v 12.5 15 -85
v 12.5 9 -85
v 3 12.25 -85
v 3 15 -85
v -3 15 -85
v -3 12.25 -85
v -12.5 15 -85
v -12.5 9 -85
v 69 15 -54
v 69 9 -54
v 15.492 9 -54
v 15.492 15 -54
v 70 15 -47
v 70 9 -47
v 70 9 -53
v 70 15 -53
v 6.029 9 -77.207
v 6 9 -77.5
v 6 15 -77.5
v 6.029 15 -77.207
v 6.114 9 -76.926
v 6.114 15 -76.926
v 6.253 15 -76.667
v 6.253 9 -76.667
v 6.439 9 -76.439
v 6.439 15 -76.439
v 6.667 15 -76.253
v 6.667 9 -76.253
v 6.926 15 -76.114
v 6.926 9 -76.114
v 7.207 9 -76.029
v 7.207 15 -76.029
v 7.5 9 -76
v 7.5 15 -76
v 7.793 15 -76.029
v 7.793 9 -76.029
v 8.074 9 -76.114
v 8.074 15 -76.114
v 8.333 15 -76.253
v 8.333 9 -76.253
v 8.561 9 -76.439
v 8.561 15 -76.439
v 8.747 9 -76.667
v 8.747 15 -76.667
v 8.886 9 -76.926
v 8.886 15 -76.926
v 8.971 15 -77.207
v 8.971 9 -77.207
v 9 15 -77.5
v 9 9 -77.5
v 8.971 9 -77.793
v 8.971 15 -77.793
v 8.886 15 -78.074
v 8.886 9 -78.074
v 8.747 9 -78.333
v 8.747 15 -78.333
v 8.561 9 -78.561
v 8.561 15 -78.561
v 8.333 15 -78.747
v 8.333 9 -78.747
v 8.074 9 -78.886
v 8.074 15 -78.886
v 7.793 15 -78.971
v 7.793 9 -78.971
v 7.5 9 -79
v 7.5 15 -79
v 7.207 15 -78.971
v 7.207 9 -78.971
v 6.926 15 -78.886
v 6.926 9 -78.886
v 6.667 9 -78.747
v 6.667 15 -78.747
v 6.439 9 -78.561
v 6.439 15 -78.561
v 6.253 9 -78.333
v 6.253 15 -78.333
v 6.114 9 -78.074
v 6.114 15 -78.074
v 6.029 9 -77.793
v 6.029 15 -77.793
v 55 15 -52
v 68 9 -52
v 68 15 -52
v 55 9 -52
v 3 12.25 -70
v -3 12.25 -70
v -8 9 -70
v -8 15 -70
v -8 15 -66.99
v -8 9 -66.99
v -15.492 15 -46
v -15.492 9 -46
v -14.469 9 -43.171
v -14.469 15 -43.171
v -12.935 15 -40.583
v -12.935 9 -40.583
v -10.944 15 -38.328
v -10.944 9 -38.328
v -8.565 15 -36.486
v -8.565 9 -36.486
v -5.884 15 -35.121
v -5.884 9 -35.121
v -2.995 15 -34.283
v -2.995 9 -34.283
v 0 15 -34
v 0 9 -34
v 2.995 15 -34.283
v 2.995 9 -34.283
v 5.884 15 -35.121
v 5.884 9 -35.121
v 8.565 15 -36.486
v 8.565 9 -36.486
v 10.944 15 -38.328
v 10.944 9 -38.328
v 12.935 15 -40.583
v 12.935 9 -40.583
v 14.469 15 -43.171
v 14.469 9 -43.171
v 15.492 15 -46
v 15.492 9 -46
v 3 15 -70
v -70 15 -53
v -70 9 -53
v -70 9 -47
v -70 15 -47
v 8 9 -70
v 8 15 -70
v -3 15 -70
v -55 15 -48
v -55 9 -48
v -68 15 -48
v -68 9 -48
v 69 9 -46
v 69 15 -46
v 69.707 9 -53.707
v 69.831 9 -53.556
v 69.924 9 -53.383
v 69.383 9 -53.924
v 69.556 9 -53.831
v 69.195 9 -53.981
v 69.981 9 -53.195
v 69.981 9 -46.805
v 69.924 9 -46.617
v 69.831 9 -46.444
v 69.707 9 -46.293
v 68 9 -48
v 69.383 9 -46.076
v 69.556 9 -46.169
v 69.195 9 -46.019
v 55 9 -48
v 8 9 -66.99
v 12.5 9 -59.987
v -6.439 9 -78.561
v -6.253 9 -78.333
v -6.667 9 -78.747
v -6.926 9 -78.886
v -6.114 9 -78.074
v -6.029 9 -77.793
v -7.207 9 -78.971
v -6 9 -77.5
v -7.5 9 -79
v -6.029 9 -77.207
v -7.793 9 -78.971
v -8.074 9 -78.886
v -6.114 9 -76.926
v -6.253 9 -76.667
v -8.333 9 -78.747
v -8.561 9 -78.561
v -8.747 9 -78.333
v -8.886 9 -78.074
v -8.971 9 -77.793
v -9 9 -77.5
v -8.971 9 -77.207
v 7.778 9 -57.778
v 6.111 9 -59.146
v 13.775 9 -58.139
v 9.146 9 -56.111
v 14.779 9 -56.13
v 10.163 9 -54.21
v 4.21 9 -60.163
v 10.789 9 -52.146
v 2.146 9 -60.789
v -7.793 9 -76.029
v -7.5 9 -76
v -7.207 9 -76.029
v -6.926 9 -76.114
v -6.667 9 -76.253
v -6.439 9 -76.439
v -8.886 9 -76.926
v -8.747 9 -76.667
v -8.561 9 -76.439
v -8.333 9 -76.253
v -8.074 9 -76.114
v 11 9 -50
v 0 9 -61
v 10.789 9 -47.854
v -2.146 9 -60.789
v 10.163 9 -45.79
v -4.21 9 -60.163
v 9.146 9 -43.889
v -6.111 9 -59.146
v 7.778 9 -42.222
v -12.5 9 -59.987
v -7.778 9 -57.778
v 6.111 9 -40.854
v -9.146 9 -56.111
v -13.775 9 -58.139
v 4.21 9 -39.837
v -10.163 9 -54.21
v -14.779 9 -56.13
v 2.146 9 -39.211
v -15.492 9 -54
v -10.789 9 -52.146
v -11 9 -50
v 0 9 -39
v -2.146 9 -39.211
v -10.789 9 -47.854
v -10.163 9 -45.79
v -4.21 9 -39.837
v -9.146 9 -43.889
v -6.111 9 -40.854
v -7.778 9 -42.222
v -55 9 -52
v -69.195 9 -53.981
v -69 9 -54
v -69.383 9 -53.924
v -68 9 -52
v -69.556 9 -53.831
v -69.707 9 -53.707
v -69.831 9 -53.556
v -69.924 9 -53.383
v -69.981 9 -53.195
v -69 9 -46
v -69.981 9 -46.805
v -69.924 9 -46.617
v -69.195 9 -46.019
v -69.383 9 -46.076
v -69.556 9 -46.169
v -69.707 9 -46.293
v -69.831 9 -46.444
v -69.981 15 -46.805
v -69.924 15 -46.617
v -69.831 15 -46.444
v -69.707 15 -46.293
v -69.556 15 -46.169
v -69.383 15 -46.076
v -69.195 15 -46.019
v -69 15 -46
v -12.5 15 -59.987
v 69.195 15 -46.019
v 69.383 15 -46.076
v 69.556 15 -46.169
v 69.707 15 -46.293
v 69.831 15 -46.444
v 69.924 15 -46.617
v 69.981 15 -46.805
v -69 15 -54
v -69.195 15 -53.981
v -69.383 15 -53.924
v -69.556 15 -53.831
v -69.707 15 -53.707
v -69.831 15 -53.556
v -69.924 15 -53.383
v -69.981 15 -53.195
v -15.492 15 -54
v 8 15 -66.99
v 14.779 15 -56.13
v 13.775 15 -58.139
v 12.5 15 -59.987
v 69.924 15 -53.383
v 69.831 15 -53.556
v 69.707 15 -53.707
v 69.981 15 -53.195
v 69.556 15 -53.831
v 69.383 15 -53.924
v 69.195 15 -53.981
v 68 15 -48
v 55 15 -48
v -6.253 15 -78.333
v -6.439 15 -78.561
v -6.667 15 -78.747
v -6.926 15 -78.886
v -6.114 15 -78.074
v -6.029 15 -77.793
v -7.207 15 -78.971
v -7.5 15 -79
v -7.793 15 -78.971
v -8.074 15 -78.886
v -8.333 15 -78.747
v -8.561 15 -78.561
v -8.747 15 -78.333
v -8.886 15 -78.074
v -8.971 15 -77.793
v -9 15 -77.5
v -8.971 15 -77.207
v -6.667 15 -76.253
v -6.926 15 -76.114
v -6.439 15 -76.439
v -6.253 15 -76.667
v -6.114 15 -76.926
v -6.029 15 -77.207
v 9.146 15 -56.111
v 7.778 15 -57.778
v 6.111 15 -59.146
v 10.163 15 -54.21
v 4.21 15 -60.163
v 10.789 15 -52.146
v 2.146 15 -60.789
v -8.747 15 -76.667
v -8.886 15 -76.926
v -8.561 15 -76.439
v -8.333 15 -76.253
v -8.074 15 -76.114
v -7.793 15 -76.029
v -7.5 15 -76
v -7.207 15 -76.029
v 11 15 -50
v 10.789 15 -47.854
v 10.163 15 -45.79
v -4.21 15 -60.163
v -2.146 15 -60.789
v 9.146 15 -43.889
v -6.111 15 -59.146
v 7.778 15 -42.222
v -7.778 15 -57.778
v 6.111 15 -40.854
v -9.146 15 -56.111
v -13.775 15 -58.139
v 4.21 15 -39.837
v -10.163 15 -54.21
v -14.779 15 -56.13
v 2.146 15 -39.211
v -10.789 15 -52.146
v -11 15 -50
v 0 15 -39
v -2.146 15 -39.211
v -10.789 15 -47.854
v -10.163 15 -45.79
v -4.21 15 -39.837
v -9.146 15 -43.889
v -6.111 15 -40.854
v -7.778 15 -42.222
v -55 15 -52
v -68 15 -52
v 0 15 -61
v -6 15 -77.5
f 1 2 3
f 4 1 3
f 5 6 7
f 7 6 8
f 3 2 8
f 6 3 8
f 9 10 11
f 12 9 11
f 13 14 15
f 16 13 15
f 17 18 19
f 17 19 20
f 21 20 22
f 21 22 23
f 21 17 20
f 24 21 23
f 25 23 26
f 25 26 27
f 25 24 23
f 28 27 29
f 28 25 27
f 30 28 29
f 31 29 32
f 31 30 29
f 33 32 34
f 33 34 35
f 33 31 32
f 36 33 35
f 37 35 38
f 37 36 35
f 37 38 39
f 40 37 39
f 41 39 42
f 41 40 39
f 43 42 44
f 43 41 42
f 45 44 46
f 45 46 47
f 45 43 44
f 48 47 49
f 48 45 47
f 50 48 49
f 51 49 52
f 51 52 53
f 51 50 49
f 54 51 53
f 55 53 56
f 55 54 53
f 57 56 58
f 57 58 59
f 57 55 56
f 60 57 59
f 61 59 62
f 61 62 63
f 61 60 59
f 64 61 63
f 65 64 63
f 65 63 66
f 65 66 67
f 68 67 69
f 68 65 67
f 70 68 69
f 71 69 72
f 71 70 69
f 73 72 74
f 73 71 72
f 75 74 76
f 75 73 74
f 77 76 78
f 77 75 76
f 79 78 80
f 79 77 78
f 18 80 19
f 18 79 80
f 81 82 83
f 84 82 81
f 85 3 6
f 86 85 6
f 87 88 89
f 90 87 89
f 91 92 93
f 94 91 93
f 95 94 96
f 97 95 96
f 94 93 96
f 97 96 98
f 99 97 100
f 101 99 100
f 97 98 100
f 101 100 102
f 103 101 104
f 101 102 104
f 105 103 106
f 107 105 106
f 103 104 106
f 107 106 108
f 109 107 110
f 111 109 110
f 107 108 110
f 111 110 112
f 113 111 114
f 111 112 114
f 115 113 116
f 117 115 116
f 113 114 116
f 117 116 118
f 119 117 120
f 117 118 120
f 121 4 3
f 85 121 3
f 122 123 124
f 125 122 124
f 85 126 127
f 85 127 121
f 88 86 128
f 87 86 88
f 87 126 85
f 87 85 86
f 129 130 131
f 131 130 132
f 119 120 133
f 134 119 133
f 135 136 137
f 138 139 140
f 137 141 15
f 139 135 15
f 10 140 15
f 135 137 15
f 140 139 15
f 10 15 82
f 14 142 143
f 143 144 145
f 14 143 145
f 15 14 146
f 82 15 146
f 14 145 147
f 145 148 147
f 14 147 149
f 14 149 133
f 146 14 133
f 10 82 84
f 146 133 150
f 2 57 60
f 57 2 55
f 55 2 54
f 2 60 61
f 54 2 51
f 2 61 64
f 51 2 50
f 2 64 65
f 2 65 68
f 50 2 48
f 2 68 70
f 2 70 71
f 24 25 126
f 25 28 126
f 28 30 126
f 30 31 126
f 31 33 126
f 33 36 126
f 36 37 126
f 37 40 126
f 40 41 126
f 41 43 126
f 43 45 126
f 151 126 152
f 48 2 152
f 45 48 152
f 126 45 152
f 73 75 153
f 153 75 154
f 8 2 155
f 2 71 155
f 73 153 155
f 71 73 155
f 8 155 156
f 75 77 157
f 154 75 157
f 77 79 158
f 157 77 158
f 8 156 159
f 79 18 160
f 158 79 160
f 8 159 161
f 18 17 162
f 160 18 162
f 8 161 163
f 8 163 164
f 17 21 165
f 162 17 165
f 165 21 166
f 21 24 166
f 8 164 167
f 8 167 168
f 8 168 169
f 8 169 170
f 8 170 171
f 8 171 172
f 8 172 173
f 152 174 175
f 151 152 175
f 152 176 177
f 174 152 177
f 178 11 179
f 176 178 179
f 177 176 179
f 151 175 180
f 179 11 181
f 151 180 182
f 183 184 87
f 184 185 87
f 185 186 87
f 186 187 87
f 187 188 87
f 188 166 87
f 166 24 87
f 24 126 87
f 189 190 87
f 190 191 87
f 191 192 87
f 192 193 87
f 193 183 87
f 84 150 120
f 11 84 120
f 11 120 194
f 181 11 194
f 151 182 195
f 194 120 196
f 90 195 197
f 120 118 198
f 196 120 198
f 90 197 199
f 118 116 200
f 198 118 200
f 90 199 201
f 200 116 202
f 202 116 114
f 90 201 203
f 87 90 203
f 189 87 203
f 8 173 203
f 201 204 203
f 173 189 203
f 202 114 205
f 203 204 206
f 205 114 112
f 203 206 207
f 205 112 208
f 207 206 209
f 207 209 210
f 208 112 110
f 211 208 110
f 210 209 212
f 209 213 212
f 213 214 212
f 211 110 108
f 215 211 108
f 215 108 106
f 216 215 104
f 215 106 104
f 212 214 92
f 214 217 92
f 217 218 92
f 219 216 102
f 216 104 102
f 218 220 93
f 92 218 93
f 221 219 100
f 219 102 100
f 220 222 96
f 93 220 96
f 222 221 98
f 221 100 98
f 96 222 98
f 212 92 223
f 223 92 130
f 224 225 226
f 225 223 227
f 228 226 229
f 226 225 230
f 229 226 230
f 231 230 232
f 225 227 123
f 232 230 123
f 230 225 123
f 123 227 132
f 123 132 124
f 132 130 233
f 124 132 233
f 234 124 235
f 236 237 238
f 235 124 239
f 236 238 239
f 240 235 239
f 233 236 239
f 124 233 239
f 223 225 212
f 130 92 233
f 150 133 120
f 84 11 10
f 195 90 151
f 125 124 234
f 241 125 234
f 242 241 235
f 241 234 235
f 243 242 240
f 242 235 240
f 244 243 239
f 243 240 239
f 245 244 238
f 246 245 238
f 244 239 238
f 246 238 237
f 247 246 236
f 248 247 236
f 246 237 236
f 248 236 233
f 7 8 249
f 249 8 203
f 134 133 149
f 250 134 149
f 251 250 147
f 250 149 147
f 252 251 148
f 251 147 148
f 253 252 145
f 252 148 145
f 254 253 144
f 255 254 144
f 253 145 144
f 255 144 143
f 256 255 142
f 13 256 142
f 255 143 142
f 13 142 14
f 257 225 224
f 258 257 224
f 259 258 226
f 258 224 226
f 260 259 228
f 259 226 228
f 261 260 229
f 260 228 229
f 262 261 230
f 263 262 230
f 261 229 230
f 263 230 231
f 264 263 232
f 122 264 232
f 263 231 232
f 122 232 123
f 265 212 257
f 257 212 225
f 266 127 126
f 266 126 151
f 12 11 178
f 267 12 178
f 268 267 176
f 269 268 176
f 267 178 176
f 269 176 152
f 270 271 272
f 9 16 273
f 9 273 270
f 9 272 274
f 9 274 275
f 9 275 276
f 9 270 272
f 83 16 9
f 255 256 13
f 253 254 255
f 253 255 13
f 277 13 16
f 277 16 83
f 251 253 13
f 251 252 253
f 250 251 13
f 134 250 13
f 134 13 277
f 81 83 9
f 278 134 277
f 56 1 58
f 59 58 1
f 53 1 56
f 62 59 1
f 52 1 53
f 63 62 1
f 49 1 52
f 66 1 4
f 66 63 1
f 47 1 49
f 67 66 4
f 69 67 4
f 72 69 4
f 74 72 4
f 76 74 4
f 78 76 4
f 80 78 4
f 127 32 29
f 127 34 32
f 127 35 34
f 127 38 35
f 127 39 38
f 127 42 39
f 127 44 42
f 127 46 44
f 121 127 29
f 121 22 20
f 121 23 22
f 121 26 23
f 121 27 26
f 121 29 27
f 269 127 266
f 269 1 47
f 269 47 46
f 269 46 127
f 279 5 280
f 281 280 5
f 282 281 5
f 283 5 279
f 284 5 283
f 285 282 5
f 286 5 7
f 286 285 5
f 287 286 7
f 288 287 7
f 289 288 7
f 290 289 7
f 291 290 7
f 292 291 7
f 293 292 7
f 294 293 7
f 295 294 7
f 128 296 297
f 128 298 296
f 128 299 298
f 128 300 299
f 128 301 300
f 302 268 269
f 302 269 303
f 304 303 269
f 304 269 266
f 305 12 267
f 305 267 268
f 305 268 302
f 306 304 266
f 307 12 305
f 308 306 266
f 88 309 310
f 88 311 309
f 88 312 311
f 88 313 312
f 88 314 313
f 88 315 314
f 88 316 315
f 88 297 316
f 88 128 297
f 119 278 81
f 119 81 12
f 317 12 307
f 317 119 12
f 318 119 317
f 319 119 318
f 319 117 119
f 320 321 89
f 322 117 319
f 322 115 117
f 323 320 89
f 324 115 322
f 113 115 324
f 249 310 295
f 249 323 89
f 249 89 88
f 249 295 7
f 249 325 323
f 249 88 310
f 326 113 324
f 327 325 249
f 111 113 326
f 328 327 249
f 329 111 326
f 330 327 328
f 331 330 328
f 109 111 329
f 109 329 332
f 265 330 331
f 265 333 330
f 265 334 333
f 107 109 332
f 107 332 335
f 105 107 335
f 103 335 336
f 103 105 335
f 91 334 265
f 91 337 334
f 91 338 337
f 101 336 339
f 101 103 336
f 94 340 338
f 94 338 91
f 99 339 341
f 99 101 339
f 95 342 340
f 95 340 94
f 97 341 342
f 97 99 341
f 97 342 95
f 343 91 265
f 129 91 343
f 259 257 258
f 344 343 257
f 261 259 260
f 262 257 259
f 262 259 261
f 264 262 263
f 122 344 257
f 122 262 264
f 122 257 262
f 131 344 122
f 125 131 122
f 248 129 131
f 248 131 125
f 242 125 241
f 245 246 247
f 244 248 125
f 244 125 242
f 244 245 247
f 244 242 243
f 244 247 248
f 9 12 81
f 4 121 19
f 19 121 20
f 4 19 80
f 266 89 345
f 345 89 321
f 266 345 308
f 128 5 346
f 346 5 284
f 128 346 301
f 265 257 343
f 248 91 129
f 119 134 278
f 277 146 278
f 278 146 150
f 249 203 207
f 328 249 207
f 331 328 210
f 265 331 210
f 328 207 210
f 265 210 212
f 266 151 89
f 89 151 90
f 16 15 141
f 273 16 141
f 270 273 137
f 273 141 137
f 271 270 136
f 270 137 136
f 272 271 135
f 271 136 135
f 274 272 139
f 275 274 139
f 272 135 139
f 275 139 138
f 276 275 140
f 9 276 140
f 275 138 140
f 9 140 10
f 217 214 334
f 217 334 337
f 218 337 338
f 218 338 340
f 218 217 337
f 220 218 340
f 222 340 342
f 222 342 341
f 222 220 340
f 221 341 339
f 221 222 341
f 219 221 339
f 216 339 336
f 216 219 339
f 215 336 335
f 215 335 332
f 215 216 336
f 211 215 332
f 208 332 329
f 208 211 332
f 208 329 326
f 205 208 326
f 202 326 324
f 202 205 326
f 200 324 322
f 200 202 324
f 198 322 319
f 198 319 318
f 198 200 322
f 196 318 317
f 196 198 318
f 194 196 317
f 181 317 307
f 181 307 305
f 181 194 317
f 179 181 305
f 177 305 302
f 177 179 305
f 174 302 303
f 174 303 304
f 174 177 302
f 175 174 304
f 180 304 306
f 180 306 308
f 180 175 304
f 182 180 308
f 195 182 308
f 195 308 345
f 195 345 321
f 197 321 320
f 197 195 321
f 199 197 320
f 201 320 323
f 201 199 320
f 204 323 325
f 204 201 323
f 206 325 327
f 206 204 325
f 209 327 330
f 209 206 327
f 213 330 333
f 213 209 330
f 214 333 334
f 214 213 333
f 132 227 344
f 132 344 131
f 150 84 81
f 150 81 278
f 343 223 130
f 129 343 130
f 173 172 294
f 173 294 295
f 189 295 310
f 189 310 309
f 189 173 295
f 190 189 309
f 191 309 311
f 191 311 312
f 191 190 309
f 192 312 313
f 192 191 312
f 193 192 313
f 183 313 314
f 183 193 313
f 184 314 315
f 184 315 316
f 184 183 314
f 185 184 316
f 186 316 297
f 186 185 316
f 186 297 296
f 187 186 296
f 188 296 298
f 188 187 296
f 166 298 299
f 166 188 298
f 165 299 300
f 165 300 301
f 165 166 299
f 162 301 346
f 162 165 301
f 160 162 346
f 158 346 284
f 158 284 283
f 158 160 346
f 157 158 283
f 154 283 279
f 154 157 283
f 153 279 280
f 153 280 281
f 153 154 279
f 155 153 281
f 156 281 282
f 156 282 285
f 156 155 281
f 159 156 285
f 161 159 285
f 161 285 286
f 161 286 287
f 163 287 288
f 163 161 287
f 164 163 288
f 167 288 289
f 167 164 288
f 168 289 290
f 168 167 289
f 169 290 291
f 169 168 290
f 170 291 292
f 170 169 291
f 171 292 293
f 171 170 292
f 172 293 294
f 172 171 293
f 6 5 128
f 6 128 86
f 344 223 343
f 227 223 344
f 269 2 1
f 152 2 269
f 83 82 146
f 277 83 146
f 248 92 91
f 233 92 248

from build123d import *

# Parameters (mm, degrees)
BOX004_W                     = 6
BOX004_H                     = 2.75
BOX004_DEPTH                 = 15
SKETCH023_R                  = 11
SKETCH023_R_2                = 1.5
SKETCH023_W                  = 13
SKETCH023_H                  = 4
SKETCH023_W_2                = 16
SKETCH023_H_2                = 3.01
EXTRUDE015_DEPTH             = 6
CUT002002009_PLACEMENT_ANGLE = 180


with BuildPart() as pendulumclampslot:
    # Box004 → Box004 (new body)
    with BuildSketch(Plane(origin=(-3, 15, -85), x_dir=(1, 0, 0), z_dir=(0, 0, 1))):
        with Locations((3, 1.375)):
            Rectangle(BOX004_W, BOX004_H)
    extrude(amount=BOX004_DEPTH)


with BuildPart() as pendulumclampfront:
    # Sketch023 → Extrude015 (new body)
    with BuildSketch(Plane(origin=(0, 21, -50), x_dir=(1, 0, 0), z_dir=(0, -1, 0))):
        with BuildLine():
            ThreePointArc((-15.491933, -4), (-14.312568, -7.151951), (-12.5, -9.987492))
            Line((-12.5, -35), (-12.5, -9.987492))
            Line((-12.5, -35), (12.5, -35))
            Line((12.5, -35), (12.5, -9.987492))
            ThreePointArc((12.5, -9.987492), (14.312568, -7.151951), (15.491933, -4))
            Line((15.491933, -4), (69, -4))
            ThreePointArc((69, -4), (69.707107, -3.707107), (70, -3))
            Line((70, -3), (70, 3))
            ThreePointArc((70, 3), (69.707107, 3.707107), (69, 4))
            Line((15.491933, 4), (69, 4))
            ThreePointArc((15.491933, 4), (0, 16), (-15.491933, 4))
            Line((-15.491933, 4), (-69, 4))
            ThreePointArc((-69, 4), (-69.707107, 3.707107), (-70, 3))
            Line((-70, 3), (-70, -3))
            ThreePointArc((-70, -3), (-69.707107, -3.707107), (-69, -4))
            Line((-69, -4), (-15.491933, -4))
        make_face()
        Circle(SKETCH023_R, mode=Mode.SUBTRACT)
        with Locations((-7.5, -27.5)):
            Circle(SKETCH023_R_2, mode=Mode.SUBTRACT)
        with Locations((7.5, -27.5)):
            Circle(SKETCH023_R_2, mode=Mode.SUBTRACT)
        with Locations((-61.5, 0)):
            Rectangle(SKETCH023_W, SKETCH023_H, mode=Mode.SUBTRACT)
        with Locations((61.5, 0)):
            Rectangle(SKETCH023_W, SKETCH023_H, mode=Mode.SUBTRACT)
        with Locations((0, -18.495)):
            Rectangle(SKETCH023_W_2, SKETCH023_H_2, mode=Mode.SUBTRACT)
    extrude(amount=EXTRUDE015_DEPTH)

    # Cut002002009: cut PendulumClampSlot
    add(pendulumclampslot.part, mode=Mode.SUBTRACT)


with BuildPart() as pendulumclampfront_1:
    # Cut002002009 placement: moved
    add(pendulumclampfront.part.moved(Location((0, 30, 0))).rotate(Axis((0, 30, 0), (0, 0, 1)), CUT002002009_PLACEMENT_ANGLE))


solid = pendulumclampfront_1.part
